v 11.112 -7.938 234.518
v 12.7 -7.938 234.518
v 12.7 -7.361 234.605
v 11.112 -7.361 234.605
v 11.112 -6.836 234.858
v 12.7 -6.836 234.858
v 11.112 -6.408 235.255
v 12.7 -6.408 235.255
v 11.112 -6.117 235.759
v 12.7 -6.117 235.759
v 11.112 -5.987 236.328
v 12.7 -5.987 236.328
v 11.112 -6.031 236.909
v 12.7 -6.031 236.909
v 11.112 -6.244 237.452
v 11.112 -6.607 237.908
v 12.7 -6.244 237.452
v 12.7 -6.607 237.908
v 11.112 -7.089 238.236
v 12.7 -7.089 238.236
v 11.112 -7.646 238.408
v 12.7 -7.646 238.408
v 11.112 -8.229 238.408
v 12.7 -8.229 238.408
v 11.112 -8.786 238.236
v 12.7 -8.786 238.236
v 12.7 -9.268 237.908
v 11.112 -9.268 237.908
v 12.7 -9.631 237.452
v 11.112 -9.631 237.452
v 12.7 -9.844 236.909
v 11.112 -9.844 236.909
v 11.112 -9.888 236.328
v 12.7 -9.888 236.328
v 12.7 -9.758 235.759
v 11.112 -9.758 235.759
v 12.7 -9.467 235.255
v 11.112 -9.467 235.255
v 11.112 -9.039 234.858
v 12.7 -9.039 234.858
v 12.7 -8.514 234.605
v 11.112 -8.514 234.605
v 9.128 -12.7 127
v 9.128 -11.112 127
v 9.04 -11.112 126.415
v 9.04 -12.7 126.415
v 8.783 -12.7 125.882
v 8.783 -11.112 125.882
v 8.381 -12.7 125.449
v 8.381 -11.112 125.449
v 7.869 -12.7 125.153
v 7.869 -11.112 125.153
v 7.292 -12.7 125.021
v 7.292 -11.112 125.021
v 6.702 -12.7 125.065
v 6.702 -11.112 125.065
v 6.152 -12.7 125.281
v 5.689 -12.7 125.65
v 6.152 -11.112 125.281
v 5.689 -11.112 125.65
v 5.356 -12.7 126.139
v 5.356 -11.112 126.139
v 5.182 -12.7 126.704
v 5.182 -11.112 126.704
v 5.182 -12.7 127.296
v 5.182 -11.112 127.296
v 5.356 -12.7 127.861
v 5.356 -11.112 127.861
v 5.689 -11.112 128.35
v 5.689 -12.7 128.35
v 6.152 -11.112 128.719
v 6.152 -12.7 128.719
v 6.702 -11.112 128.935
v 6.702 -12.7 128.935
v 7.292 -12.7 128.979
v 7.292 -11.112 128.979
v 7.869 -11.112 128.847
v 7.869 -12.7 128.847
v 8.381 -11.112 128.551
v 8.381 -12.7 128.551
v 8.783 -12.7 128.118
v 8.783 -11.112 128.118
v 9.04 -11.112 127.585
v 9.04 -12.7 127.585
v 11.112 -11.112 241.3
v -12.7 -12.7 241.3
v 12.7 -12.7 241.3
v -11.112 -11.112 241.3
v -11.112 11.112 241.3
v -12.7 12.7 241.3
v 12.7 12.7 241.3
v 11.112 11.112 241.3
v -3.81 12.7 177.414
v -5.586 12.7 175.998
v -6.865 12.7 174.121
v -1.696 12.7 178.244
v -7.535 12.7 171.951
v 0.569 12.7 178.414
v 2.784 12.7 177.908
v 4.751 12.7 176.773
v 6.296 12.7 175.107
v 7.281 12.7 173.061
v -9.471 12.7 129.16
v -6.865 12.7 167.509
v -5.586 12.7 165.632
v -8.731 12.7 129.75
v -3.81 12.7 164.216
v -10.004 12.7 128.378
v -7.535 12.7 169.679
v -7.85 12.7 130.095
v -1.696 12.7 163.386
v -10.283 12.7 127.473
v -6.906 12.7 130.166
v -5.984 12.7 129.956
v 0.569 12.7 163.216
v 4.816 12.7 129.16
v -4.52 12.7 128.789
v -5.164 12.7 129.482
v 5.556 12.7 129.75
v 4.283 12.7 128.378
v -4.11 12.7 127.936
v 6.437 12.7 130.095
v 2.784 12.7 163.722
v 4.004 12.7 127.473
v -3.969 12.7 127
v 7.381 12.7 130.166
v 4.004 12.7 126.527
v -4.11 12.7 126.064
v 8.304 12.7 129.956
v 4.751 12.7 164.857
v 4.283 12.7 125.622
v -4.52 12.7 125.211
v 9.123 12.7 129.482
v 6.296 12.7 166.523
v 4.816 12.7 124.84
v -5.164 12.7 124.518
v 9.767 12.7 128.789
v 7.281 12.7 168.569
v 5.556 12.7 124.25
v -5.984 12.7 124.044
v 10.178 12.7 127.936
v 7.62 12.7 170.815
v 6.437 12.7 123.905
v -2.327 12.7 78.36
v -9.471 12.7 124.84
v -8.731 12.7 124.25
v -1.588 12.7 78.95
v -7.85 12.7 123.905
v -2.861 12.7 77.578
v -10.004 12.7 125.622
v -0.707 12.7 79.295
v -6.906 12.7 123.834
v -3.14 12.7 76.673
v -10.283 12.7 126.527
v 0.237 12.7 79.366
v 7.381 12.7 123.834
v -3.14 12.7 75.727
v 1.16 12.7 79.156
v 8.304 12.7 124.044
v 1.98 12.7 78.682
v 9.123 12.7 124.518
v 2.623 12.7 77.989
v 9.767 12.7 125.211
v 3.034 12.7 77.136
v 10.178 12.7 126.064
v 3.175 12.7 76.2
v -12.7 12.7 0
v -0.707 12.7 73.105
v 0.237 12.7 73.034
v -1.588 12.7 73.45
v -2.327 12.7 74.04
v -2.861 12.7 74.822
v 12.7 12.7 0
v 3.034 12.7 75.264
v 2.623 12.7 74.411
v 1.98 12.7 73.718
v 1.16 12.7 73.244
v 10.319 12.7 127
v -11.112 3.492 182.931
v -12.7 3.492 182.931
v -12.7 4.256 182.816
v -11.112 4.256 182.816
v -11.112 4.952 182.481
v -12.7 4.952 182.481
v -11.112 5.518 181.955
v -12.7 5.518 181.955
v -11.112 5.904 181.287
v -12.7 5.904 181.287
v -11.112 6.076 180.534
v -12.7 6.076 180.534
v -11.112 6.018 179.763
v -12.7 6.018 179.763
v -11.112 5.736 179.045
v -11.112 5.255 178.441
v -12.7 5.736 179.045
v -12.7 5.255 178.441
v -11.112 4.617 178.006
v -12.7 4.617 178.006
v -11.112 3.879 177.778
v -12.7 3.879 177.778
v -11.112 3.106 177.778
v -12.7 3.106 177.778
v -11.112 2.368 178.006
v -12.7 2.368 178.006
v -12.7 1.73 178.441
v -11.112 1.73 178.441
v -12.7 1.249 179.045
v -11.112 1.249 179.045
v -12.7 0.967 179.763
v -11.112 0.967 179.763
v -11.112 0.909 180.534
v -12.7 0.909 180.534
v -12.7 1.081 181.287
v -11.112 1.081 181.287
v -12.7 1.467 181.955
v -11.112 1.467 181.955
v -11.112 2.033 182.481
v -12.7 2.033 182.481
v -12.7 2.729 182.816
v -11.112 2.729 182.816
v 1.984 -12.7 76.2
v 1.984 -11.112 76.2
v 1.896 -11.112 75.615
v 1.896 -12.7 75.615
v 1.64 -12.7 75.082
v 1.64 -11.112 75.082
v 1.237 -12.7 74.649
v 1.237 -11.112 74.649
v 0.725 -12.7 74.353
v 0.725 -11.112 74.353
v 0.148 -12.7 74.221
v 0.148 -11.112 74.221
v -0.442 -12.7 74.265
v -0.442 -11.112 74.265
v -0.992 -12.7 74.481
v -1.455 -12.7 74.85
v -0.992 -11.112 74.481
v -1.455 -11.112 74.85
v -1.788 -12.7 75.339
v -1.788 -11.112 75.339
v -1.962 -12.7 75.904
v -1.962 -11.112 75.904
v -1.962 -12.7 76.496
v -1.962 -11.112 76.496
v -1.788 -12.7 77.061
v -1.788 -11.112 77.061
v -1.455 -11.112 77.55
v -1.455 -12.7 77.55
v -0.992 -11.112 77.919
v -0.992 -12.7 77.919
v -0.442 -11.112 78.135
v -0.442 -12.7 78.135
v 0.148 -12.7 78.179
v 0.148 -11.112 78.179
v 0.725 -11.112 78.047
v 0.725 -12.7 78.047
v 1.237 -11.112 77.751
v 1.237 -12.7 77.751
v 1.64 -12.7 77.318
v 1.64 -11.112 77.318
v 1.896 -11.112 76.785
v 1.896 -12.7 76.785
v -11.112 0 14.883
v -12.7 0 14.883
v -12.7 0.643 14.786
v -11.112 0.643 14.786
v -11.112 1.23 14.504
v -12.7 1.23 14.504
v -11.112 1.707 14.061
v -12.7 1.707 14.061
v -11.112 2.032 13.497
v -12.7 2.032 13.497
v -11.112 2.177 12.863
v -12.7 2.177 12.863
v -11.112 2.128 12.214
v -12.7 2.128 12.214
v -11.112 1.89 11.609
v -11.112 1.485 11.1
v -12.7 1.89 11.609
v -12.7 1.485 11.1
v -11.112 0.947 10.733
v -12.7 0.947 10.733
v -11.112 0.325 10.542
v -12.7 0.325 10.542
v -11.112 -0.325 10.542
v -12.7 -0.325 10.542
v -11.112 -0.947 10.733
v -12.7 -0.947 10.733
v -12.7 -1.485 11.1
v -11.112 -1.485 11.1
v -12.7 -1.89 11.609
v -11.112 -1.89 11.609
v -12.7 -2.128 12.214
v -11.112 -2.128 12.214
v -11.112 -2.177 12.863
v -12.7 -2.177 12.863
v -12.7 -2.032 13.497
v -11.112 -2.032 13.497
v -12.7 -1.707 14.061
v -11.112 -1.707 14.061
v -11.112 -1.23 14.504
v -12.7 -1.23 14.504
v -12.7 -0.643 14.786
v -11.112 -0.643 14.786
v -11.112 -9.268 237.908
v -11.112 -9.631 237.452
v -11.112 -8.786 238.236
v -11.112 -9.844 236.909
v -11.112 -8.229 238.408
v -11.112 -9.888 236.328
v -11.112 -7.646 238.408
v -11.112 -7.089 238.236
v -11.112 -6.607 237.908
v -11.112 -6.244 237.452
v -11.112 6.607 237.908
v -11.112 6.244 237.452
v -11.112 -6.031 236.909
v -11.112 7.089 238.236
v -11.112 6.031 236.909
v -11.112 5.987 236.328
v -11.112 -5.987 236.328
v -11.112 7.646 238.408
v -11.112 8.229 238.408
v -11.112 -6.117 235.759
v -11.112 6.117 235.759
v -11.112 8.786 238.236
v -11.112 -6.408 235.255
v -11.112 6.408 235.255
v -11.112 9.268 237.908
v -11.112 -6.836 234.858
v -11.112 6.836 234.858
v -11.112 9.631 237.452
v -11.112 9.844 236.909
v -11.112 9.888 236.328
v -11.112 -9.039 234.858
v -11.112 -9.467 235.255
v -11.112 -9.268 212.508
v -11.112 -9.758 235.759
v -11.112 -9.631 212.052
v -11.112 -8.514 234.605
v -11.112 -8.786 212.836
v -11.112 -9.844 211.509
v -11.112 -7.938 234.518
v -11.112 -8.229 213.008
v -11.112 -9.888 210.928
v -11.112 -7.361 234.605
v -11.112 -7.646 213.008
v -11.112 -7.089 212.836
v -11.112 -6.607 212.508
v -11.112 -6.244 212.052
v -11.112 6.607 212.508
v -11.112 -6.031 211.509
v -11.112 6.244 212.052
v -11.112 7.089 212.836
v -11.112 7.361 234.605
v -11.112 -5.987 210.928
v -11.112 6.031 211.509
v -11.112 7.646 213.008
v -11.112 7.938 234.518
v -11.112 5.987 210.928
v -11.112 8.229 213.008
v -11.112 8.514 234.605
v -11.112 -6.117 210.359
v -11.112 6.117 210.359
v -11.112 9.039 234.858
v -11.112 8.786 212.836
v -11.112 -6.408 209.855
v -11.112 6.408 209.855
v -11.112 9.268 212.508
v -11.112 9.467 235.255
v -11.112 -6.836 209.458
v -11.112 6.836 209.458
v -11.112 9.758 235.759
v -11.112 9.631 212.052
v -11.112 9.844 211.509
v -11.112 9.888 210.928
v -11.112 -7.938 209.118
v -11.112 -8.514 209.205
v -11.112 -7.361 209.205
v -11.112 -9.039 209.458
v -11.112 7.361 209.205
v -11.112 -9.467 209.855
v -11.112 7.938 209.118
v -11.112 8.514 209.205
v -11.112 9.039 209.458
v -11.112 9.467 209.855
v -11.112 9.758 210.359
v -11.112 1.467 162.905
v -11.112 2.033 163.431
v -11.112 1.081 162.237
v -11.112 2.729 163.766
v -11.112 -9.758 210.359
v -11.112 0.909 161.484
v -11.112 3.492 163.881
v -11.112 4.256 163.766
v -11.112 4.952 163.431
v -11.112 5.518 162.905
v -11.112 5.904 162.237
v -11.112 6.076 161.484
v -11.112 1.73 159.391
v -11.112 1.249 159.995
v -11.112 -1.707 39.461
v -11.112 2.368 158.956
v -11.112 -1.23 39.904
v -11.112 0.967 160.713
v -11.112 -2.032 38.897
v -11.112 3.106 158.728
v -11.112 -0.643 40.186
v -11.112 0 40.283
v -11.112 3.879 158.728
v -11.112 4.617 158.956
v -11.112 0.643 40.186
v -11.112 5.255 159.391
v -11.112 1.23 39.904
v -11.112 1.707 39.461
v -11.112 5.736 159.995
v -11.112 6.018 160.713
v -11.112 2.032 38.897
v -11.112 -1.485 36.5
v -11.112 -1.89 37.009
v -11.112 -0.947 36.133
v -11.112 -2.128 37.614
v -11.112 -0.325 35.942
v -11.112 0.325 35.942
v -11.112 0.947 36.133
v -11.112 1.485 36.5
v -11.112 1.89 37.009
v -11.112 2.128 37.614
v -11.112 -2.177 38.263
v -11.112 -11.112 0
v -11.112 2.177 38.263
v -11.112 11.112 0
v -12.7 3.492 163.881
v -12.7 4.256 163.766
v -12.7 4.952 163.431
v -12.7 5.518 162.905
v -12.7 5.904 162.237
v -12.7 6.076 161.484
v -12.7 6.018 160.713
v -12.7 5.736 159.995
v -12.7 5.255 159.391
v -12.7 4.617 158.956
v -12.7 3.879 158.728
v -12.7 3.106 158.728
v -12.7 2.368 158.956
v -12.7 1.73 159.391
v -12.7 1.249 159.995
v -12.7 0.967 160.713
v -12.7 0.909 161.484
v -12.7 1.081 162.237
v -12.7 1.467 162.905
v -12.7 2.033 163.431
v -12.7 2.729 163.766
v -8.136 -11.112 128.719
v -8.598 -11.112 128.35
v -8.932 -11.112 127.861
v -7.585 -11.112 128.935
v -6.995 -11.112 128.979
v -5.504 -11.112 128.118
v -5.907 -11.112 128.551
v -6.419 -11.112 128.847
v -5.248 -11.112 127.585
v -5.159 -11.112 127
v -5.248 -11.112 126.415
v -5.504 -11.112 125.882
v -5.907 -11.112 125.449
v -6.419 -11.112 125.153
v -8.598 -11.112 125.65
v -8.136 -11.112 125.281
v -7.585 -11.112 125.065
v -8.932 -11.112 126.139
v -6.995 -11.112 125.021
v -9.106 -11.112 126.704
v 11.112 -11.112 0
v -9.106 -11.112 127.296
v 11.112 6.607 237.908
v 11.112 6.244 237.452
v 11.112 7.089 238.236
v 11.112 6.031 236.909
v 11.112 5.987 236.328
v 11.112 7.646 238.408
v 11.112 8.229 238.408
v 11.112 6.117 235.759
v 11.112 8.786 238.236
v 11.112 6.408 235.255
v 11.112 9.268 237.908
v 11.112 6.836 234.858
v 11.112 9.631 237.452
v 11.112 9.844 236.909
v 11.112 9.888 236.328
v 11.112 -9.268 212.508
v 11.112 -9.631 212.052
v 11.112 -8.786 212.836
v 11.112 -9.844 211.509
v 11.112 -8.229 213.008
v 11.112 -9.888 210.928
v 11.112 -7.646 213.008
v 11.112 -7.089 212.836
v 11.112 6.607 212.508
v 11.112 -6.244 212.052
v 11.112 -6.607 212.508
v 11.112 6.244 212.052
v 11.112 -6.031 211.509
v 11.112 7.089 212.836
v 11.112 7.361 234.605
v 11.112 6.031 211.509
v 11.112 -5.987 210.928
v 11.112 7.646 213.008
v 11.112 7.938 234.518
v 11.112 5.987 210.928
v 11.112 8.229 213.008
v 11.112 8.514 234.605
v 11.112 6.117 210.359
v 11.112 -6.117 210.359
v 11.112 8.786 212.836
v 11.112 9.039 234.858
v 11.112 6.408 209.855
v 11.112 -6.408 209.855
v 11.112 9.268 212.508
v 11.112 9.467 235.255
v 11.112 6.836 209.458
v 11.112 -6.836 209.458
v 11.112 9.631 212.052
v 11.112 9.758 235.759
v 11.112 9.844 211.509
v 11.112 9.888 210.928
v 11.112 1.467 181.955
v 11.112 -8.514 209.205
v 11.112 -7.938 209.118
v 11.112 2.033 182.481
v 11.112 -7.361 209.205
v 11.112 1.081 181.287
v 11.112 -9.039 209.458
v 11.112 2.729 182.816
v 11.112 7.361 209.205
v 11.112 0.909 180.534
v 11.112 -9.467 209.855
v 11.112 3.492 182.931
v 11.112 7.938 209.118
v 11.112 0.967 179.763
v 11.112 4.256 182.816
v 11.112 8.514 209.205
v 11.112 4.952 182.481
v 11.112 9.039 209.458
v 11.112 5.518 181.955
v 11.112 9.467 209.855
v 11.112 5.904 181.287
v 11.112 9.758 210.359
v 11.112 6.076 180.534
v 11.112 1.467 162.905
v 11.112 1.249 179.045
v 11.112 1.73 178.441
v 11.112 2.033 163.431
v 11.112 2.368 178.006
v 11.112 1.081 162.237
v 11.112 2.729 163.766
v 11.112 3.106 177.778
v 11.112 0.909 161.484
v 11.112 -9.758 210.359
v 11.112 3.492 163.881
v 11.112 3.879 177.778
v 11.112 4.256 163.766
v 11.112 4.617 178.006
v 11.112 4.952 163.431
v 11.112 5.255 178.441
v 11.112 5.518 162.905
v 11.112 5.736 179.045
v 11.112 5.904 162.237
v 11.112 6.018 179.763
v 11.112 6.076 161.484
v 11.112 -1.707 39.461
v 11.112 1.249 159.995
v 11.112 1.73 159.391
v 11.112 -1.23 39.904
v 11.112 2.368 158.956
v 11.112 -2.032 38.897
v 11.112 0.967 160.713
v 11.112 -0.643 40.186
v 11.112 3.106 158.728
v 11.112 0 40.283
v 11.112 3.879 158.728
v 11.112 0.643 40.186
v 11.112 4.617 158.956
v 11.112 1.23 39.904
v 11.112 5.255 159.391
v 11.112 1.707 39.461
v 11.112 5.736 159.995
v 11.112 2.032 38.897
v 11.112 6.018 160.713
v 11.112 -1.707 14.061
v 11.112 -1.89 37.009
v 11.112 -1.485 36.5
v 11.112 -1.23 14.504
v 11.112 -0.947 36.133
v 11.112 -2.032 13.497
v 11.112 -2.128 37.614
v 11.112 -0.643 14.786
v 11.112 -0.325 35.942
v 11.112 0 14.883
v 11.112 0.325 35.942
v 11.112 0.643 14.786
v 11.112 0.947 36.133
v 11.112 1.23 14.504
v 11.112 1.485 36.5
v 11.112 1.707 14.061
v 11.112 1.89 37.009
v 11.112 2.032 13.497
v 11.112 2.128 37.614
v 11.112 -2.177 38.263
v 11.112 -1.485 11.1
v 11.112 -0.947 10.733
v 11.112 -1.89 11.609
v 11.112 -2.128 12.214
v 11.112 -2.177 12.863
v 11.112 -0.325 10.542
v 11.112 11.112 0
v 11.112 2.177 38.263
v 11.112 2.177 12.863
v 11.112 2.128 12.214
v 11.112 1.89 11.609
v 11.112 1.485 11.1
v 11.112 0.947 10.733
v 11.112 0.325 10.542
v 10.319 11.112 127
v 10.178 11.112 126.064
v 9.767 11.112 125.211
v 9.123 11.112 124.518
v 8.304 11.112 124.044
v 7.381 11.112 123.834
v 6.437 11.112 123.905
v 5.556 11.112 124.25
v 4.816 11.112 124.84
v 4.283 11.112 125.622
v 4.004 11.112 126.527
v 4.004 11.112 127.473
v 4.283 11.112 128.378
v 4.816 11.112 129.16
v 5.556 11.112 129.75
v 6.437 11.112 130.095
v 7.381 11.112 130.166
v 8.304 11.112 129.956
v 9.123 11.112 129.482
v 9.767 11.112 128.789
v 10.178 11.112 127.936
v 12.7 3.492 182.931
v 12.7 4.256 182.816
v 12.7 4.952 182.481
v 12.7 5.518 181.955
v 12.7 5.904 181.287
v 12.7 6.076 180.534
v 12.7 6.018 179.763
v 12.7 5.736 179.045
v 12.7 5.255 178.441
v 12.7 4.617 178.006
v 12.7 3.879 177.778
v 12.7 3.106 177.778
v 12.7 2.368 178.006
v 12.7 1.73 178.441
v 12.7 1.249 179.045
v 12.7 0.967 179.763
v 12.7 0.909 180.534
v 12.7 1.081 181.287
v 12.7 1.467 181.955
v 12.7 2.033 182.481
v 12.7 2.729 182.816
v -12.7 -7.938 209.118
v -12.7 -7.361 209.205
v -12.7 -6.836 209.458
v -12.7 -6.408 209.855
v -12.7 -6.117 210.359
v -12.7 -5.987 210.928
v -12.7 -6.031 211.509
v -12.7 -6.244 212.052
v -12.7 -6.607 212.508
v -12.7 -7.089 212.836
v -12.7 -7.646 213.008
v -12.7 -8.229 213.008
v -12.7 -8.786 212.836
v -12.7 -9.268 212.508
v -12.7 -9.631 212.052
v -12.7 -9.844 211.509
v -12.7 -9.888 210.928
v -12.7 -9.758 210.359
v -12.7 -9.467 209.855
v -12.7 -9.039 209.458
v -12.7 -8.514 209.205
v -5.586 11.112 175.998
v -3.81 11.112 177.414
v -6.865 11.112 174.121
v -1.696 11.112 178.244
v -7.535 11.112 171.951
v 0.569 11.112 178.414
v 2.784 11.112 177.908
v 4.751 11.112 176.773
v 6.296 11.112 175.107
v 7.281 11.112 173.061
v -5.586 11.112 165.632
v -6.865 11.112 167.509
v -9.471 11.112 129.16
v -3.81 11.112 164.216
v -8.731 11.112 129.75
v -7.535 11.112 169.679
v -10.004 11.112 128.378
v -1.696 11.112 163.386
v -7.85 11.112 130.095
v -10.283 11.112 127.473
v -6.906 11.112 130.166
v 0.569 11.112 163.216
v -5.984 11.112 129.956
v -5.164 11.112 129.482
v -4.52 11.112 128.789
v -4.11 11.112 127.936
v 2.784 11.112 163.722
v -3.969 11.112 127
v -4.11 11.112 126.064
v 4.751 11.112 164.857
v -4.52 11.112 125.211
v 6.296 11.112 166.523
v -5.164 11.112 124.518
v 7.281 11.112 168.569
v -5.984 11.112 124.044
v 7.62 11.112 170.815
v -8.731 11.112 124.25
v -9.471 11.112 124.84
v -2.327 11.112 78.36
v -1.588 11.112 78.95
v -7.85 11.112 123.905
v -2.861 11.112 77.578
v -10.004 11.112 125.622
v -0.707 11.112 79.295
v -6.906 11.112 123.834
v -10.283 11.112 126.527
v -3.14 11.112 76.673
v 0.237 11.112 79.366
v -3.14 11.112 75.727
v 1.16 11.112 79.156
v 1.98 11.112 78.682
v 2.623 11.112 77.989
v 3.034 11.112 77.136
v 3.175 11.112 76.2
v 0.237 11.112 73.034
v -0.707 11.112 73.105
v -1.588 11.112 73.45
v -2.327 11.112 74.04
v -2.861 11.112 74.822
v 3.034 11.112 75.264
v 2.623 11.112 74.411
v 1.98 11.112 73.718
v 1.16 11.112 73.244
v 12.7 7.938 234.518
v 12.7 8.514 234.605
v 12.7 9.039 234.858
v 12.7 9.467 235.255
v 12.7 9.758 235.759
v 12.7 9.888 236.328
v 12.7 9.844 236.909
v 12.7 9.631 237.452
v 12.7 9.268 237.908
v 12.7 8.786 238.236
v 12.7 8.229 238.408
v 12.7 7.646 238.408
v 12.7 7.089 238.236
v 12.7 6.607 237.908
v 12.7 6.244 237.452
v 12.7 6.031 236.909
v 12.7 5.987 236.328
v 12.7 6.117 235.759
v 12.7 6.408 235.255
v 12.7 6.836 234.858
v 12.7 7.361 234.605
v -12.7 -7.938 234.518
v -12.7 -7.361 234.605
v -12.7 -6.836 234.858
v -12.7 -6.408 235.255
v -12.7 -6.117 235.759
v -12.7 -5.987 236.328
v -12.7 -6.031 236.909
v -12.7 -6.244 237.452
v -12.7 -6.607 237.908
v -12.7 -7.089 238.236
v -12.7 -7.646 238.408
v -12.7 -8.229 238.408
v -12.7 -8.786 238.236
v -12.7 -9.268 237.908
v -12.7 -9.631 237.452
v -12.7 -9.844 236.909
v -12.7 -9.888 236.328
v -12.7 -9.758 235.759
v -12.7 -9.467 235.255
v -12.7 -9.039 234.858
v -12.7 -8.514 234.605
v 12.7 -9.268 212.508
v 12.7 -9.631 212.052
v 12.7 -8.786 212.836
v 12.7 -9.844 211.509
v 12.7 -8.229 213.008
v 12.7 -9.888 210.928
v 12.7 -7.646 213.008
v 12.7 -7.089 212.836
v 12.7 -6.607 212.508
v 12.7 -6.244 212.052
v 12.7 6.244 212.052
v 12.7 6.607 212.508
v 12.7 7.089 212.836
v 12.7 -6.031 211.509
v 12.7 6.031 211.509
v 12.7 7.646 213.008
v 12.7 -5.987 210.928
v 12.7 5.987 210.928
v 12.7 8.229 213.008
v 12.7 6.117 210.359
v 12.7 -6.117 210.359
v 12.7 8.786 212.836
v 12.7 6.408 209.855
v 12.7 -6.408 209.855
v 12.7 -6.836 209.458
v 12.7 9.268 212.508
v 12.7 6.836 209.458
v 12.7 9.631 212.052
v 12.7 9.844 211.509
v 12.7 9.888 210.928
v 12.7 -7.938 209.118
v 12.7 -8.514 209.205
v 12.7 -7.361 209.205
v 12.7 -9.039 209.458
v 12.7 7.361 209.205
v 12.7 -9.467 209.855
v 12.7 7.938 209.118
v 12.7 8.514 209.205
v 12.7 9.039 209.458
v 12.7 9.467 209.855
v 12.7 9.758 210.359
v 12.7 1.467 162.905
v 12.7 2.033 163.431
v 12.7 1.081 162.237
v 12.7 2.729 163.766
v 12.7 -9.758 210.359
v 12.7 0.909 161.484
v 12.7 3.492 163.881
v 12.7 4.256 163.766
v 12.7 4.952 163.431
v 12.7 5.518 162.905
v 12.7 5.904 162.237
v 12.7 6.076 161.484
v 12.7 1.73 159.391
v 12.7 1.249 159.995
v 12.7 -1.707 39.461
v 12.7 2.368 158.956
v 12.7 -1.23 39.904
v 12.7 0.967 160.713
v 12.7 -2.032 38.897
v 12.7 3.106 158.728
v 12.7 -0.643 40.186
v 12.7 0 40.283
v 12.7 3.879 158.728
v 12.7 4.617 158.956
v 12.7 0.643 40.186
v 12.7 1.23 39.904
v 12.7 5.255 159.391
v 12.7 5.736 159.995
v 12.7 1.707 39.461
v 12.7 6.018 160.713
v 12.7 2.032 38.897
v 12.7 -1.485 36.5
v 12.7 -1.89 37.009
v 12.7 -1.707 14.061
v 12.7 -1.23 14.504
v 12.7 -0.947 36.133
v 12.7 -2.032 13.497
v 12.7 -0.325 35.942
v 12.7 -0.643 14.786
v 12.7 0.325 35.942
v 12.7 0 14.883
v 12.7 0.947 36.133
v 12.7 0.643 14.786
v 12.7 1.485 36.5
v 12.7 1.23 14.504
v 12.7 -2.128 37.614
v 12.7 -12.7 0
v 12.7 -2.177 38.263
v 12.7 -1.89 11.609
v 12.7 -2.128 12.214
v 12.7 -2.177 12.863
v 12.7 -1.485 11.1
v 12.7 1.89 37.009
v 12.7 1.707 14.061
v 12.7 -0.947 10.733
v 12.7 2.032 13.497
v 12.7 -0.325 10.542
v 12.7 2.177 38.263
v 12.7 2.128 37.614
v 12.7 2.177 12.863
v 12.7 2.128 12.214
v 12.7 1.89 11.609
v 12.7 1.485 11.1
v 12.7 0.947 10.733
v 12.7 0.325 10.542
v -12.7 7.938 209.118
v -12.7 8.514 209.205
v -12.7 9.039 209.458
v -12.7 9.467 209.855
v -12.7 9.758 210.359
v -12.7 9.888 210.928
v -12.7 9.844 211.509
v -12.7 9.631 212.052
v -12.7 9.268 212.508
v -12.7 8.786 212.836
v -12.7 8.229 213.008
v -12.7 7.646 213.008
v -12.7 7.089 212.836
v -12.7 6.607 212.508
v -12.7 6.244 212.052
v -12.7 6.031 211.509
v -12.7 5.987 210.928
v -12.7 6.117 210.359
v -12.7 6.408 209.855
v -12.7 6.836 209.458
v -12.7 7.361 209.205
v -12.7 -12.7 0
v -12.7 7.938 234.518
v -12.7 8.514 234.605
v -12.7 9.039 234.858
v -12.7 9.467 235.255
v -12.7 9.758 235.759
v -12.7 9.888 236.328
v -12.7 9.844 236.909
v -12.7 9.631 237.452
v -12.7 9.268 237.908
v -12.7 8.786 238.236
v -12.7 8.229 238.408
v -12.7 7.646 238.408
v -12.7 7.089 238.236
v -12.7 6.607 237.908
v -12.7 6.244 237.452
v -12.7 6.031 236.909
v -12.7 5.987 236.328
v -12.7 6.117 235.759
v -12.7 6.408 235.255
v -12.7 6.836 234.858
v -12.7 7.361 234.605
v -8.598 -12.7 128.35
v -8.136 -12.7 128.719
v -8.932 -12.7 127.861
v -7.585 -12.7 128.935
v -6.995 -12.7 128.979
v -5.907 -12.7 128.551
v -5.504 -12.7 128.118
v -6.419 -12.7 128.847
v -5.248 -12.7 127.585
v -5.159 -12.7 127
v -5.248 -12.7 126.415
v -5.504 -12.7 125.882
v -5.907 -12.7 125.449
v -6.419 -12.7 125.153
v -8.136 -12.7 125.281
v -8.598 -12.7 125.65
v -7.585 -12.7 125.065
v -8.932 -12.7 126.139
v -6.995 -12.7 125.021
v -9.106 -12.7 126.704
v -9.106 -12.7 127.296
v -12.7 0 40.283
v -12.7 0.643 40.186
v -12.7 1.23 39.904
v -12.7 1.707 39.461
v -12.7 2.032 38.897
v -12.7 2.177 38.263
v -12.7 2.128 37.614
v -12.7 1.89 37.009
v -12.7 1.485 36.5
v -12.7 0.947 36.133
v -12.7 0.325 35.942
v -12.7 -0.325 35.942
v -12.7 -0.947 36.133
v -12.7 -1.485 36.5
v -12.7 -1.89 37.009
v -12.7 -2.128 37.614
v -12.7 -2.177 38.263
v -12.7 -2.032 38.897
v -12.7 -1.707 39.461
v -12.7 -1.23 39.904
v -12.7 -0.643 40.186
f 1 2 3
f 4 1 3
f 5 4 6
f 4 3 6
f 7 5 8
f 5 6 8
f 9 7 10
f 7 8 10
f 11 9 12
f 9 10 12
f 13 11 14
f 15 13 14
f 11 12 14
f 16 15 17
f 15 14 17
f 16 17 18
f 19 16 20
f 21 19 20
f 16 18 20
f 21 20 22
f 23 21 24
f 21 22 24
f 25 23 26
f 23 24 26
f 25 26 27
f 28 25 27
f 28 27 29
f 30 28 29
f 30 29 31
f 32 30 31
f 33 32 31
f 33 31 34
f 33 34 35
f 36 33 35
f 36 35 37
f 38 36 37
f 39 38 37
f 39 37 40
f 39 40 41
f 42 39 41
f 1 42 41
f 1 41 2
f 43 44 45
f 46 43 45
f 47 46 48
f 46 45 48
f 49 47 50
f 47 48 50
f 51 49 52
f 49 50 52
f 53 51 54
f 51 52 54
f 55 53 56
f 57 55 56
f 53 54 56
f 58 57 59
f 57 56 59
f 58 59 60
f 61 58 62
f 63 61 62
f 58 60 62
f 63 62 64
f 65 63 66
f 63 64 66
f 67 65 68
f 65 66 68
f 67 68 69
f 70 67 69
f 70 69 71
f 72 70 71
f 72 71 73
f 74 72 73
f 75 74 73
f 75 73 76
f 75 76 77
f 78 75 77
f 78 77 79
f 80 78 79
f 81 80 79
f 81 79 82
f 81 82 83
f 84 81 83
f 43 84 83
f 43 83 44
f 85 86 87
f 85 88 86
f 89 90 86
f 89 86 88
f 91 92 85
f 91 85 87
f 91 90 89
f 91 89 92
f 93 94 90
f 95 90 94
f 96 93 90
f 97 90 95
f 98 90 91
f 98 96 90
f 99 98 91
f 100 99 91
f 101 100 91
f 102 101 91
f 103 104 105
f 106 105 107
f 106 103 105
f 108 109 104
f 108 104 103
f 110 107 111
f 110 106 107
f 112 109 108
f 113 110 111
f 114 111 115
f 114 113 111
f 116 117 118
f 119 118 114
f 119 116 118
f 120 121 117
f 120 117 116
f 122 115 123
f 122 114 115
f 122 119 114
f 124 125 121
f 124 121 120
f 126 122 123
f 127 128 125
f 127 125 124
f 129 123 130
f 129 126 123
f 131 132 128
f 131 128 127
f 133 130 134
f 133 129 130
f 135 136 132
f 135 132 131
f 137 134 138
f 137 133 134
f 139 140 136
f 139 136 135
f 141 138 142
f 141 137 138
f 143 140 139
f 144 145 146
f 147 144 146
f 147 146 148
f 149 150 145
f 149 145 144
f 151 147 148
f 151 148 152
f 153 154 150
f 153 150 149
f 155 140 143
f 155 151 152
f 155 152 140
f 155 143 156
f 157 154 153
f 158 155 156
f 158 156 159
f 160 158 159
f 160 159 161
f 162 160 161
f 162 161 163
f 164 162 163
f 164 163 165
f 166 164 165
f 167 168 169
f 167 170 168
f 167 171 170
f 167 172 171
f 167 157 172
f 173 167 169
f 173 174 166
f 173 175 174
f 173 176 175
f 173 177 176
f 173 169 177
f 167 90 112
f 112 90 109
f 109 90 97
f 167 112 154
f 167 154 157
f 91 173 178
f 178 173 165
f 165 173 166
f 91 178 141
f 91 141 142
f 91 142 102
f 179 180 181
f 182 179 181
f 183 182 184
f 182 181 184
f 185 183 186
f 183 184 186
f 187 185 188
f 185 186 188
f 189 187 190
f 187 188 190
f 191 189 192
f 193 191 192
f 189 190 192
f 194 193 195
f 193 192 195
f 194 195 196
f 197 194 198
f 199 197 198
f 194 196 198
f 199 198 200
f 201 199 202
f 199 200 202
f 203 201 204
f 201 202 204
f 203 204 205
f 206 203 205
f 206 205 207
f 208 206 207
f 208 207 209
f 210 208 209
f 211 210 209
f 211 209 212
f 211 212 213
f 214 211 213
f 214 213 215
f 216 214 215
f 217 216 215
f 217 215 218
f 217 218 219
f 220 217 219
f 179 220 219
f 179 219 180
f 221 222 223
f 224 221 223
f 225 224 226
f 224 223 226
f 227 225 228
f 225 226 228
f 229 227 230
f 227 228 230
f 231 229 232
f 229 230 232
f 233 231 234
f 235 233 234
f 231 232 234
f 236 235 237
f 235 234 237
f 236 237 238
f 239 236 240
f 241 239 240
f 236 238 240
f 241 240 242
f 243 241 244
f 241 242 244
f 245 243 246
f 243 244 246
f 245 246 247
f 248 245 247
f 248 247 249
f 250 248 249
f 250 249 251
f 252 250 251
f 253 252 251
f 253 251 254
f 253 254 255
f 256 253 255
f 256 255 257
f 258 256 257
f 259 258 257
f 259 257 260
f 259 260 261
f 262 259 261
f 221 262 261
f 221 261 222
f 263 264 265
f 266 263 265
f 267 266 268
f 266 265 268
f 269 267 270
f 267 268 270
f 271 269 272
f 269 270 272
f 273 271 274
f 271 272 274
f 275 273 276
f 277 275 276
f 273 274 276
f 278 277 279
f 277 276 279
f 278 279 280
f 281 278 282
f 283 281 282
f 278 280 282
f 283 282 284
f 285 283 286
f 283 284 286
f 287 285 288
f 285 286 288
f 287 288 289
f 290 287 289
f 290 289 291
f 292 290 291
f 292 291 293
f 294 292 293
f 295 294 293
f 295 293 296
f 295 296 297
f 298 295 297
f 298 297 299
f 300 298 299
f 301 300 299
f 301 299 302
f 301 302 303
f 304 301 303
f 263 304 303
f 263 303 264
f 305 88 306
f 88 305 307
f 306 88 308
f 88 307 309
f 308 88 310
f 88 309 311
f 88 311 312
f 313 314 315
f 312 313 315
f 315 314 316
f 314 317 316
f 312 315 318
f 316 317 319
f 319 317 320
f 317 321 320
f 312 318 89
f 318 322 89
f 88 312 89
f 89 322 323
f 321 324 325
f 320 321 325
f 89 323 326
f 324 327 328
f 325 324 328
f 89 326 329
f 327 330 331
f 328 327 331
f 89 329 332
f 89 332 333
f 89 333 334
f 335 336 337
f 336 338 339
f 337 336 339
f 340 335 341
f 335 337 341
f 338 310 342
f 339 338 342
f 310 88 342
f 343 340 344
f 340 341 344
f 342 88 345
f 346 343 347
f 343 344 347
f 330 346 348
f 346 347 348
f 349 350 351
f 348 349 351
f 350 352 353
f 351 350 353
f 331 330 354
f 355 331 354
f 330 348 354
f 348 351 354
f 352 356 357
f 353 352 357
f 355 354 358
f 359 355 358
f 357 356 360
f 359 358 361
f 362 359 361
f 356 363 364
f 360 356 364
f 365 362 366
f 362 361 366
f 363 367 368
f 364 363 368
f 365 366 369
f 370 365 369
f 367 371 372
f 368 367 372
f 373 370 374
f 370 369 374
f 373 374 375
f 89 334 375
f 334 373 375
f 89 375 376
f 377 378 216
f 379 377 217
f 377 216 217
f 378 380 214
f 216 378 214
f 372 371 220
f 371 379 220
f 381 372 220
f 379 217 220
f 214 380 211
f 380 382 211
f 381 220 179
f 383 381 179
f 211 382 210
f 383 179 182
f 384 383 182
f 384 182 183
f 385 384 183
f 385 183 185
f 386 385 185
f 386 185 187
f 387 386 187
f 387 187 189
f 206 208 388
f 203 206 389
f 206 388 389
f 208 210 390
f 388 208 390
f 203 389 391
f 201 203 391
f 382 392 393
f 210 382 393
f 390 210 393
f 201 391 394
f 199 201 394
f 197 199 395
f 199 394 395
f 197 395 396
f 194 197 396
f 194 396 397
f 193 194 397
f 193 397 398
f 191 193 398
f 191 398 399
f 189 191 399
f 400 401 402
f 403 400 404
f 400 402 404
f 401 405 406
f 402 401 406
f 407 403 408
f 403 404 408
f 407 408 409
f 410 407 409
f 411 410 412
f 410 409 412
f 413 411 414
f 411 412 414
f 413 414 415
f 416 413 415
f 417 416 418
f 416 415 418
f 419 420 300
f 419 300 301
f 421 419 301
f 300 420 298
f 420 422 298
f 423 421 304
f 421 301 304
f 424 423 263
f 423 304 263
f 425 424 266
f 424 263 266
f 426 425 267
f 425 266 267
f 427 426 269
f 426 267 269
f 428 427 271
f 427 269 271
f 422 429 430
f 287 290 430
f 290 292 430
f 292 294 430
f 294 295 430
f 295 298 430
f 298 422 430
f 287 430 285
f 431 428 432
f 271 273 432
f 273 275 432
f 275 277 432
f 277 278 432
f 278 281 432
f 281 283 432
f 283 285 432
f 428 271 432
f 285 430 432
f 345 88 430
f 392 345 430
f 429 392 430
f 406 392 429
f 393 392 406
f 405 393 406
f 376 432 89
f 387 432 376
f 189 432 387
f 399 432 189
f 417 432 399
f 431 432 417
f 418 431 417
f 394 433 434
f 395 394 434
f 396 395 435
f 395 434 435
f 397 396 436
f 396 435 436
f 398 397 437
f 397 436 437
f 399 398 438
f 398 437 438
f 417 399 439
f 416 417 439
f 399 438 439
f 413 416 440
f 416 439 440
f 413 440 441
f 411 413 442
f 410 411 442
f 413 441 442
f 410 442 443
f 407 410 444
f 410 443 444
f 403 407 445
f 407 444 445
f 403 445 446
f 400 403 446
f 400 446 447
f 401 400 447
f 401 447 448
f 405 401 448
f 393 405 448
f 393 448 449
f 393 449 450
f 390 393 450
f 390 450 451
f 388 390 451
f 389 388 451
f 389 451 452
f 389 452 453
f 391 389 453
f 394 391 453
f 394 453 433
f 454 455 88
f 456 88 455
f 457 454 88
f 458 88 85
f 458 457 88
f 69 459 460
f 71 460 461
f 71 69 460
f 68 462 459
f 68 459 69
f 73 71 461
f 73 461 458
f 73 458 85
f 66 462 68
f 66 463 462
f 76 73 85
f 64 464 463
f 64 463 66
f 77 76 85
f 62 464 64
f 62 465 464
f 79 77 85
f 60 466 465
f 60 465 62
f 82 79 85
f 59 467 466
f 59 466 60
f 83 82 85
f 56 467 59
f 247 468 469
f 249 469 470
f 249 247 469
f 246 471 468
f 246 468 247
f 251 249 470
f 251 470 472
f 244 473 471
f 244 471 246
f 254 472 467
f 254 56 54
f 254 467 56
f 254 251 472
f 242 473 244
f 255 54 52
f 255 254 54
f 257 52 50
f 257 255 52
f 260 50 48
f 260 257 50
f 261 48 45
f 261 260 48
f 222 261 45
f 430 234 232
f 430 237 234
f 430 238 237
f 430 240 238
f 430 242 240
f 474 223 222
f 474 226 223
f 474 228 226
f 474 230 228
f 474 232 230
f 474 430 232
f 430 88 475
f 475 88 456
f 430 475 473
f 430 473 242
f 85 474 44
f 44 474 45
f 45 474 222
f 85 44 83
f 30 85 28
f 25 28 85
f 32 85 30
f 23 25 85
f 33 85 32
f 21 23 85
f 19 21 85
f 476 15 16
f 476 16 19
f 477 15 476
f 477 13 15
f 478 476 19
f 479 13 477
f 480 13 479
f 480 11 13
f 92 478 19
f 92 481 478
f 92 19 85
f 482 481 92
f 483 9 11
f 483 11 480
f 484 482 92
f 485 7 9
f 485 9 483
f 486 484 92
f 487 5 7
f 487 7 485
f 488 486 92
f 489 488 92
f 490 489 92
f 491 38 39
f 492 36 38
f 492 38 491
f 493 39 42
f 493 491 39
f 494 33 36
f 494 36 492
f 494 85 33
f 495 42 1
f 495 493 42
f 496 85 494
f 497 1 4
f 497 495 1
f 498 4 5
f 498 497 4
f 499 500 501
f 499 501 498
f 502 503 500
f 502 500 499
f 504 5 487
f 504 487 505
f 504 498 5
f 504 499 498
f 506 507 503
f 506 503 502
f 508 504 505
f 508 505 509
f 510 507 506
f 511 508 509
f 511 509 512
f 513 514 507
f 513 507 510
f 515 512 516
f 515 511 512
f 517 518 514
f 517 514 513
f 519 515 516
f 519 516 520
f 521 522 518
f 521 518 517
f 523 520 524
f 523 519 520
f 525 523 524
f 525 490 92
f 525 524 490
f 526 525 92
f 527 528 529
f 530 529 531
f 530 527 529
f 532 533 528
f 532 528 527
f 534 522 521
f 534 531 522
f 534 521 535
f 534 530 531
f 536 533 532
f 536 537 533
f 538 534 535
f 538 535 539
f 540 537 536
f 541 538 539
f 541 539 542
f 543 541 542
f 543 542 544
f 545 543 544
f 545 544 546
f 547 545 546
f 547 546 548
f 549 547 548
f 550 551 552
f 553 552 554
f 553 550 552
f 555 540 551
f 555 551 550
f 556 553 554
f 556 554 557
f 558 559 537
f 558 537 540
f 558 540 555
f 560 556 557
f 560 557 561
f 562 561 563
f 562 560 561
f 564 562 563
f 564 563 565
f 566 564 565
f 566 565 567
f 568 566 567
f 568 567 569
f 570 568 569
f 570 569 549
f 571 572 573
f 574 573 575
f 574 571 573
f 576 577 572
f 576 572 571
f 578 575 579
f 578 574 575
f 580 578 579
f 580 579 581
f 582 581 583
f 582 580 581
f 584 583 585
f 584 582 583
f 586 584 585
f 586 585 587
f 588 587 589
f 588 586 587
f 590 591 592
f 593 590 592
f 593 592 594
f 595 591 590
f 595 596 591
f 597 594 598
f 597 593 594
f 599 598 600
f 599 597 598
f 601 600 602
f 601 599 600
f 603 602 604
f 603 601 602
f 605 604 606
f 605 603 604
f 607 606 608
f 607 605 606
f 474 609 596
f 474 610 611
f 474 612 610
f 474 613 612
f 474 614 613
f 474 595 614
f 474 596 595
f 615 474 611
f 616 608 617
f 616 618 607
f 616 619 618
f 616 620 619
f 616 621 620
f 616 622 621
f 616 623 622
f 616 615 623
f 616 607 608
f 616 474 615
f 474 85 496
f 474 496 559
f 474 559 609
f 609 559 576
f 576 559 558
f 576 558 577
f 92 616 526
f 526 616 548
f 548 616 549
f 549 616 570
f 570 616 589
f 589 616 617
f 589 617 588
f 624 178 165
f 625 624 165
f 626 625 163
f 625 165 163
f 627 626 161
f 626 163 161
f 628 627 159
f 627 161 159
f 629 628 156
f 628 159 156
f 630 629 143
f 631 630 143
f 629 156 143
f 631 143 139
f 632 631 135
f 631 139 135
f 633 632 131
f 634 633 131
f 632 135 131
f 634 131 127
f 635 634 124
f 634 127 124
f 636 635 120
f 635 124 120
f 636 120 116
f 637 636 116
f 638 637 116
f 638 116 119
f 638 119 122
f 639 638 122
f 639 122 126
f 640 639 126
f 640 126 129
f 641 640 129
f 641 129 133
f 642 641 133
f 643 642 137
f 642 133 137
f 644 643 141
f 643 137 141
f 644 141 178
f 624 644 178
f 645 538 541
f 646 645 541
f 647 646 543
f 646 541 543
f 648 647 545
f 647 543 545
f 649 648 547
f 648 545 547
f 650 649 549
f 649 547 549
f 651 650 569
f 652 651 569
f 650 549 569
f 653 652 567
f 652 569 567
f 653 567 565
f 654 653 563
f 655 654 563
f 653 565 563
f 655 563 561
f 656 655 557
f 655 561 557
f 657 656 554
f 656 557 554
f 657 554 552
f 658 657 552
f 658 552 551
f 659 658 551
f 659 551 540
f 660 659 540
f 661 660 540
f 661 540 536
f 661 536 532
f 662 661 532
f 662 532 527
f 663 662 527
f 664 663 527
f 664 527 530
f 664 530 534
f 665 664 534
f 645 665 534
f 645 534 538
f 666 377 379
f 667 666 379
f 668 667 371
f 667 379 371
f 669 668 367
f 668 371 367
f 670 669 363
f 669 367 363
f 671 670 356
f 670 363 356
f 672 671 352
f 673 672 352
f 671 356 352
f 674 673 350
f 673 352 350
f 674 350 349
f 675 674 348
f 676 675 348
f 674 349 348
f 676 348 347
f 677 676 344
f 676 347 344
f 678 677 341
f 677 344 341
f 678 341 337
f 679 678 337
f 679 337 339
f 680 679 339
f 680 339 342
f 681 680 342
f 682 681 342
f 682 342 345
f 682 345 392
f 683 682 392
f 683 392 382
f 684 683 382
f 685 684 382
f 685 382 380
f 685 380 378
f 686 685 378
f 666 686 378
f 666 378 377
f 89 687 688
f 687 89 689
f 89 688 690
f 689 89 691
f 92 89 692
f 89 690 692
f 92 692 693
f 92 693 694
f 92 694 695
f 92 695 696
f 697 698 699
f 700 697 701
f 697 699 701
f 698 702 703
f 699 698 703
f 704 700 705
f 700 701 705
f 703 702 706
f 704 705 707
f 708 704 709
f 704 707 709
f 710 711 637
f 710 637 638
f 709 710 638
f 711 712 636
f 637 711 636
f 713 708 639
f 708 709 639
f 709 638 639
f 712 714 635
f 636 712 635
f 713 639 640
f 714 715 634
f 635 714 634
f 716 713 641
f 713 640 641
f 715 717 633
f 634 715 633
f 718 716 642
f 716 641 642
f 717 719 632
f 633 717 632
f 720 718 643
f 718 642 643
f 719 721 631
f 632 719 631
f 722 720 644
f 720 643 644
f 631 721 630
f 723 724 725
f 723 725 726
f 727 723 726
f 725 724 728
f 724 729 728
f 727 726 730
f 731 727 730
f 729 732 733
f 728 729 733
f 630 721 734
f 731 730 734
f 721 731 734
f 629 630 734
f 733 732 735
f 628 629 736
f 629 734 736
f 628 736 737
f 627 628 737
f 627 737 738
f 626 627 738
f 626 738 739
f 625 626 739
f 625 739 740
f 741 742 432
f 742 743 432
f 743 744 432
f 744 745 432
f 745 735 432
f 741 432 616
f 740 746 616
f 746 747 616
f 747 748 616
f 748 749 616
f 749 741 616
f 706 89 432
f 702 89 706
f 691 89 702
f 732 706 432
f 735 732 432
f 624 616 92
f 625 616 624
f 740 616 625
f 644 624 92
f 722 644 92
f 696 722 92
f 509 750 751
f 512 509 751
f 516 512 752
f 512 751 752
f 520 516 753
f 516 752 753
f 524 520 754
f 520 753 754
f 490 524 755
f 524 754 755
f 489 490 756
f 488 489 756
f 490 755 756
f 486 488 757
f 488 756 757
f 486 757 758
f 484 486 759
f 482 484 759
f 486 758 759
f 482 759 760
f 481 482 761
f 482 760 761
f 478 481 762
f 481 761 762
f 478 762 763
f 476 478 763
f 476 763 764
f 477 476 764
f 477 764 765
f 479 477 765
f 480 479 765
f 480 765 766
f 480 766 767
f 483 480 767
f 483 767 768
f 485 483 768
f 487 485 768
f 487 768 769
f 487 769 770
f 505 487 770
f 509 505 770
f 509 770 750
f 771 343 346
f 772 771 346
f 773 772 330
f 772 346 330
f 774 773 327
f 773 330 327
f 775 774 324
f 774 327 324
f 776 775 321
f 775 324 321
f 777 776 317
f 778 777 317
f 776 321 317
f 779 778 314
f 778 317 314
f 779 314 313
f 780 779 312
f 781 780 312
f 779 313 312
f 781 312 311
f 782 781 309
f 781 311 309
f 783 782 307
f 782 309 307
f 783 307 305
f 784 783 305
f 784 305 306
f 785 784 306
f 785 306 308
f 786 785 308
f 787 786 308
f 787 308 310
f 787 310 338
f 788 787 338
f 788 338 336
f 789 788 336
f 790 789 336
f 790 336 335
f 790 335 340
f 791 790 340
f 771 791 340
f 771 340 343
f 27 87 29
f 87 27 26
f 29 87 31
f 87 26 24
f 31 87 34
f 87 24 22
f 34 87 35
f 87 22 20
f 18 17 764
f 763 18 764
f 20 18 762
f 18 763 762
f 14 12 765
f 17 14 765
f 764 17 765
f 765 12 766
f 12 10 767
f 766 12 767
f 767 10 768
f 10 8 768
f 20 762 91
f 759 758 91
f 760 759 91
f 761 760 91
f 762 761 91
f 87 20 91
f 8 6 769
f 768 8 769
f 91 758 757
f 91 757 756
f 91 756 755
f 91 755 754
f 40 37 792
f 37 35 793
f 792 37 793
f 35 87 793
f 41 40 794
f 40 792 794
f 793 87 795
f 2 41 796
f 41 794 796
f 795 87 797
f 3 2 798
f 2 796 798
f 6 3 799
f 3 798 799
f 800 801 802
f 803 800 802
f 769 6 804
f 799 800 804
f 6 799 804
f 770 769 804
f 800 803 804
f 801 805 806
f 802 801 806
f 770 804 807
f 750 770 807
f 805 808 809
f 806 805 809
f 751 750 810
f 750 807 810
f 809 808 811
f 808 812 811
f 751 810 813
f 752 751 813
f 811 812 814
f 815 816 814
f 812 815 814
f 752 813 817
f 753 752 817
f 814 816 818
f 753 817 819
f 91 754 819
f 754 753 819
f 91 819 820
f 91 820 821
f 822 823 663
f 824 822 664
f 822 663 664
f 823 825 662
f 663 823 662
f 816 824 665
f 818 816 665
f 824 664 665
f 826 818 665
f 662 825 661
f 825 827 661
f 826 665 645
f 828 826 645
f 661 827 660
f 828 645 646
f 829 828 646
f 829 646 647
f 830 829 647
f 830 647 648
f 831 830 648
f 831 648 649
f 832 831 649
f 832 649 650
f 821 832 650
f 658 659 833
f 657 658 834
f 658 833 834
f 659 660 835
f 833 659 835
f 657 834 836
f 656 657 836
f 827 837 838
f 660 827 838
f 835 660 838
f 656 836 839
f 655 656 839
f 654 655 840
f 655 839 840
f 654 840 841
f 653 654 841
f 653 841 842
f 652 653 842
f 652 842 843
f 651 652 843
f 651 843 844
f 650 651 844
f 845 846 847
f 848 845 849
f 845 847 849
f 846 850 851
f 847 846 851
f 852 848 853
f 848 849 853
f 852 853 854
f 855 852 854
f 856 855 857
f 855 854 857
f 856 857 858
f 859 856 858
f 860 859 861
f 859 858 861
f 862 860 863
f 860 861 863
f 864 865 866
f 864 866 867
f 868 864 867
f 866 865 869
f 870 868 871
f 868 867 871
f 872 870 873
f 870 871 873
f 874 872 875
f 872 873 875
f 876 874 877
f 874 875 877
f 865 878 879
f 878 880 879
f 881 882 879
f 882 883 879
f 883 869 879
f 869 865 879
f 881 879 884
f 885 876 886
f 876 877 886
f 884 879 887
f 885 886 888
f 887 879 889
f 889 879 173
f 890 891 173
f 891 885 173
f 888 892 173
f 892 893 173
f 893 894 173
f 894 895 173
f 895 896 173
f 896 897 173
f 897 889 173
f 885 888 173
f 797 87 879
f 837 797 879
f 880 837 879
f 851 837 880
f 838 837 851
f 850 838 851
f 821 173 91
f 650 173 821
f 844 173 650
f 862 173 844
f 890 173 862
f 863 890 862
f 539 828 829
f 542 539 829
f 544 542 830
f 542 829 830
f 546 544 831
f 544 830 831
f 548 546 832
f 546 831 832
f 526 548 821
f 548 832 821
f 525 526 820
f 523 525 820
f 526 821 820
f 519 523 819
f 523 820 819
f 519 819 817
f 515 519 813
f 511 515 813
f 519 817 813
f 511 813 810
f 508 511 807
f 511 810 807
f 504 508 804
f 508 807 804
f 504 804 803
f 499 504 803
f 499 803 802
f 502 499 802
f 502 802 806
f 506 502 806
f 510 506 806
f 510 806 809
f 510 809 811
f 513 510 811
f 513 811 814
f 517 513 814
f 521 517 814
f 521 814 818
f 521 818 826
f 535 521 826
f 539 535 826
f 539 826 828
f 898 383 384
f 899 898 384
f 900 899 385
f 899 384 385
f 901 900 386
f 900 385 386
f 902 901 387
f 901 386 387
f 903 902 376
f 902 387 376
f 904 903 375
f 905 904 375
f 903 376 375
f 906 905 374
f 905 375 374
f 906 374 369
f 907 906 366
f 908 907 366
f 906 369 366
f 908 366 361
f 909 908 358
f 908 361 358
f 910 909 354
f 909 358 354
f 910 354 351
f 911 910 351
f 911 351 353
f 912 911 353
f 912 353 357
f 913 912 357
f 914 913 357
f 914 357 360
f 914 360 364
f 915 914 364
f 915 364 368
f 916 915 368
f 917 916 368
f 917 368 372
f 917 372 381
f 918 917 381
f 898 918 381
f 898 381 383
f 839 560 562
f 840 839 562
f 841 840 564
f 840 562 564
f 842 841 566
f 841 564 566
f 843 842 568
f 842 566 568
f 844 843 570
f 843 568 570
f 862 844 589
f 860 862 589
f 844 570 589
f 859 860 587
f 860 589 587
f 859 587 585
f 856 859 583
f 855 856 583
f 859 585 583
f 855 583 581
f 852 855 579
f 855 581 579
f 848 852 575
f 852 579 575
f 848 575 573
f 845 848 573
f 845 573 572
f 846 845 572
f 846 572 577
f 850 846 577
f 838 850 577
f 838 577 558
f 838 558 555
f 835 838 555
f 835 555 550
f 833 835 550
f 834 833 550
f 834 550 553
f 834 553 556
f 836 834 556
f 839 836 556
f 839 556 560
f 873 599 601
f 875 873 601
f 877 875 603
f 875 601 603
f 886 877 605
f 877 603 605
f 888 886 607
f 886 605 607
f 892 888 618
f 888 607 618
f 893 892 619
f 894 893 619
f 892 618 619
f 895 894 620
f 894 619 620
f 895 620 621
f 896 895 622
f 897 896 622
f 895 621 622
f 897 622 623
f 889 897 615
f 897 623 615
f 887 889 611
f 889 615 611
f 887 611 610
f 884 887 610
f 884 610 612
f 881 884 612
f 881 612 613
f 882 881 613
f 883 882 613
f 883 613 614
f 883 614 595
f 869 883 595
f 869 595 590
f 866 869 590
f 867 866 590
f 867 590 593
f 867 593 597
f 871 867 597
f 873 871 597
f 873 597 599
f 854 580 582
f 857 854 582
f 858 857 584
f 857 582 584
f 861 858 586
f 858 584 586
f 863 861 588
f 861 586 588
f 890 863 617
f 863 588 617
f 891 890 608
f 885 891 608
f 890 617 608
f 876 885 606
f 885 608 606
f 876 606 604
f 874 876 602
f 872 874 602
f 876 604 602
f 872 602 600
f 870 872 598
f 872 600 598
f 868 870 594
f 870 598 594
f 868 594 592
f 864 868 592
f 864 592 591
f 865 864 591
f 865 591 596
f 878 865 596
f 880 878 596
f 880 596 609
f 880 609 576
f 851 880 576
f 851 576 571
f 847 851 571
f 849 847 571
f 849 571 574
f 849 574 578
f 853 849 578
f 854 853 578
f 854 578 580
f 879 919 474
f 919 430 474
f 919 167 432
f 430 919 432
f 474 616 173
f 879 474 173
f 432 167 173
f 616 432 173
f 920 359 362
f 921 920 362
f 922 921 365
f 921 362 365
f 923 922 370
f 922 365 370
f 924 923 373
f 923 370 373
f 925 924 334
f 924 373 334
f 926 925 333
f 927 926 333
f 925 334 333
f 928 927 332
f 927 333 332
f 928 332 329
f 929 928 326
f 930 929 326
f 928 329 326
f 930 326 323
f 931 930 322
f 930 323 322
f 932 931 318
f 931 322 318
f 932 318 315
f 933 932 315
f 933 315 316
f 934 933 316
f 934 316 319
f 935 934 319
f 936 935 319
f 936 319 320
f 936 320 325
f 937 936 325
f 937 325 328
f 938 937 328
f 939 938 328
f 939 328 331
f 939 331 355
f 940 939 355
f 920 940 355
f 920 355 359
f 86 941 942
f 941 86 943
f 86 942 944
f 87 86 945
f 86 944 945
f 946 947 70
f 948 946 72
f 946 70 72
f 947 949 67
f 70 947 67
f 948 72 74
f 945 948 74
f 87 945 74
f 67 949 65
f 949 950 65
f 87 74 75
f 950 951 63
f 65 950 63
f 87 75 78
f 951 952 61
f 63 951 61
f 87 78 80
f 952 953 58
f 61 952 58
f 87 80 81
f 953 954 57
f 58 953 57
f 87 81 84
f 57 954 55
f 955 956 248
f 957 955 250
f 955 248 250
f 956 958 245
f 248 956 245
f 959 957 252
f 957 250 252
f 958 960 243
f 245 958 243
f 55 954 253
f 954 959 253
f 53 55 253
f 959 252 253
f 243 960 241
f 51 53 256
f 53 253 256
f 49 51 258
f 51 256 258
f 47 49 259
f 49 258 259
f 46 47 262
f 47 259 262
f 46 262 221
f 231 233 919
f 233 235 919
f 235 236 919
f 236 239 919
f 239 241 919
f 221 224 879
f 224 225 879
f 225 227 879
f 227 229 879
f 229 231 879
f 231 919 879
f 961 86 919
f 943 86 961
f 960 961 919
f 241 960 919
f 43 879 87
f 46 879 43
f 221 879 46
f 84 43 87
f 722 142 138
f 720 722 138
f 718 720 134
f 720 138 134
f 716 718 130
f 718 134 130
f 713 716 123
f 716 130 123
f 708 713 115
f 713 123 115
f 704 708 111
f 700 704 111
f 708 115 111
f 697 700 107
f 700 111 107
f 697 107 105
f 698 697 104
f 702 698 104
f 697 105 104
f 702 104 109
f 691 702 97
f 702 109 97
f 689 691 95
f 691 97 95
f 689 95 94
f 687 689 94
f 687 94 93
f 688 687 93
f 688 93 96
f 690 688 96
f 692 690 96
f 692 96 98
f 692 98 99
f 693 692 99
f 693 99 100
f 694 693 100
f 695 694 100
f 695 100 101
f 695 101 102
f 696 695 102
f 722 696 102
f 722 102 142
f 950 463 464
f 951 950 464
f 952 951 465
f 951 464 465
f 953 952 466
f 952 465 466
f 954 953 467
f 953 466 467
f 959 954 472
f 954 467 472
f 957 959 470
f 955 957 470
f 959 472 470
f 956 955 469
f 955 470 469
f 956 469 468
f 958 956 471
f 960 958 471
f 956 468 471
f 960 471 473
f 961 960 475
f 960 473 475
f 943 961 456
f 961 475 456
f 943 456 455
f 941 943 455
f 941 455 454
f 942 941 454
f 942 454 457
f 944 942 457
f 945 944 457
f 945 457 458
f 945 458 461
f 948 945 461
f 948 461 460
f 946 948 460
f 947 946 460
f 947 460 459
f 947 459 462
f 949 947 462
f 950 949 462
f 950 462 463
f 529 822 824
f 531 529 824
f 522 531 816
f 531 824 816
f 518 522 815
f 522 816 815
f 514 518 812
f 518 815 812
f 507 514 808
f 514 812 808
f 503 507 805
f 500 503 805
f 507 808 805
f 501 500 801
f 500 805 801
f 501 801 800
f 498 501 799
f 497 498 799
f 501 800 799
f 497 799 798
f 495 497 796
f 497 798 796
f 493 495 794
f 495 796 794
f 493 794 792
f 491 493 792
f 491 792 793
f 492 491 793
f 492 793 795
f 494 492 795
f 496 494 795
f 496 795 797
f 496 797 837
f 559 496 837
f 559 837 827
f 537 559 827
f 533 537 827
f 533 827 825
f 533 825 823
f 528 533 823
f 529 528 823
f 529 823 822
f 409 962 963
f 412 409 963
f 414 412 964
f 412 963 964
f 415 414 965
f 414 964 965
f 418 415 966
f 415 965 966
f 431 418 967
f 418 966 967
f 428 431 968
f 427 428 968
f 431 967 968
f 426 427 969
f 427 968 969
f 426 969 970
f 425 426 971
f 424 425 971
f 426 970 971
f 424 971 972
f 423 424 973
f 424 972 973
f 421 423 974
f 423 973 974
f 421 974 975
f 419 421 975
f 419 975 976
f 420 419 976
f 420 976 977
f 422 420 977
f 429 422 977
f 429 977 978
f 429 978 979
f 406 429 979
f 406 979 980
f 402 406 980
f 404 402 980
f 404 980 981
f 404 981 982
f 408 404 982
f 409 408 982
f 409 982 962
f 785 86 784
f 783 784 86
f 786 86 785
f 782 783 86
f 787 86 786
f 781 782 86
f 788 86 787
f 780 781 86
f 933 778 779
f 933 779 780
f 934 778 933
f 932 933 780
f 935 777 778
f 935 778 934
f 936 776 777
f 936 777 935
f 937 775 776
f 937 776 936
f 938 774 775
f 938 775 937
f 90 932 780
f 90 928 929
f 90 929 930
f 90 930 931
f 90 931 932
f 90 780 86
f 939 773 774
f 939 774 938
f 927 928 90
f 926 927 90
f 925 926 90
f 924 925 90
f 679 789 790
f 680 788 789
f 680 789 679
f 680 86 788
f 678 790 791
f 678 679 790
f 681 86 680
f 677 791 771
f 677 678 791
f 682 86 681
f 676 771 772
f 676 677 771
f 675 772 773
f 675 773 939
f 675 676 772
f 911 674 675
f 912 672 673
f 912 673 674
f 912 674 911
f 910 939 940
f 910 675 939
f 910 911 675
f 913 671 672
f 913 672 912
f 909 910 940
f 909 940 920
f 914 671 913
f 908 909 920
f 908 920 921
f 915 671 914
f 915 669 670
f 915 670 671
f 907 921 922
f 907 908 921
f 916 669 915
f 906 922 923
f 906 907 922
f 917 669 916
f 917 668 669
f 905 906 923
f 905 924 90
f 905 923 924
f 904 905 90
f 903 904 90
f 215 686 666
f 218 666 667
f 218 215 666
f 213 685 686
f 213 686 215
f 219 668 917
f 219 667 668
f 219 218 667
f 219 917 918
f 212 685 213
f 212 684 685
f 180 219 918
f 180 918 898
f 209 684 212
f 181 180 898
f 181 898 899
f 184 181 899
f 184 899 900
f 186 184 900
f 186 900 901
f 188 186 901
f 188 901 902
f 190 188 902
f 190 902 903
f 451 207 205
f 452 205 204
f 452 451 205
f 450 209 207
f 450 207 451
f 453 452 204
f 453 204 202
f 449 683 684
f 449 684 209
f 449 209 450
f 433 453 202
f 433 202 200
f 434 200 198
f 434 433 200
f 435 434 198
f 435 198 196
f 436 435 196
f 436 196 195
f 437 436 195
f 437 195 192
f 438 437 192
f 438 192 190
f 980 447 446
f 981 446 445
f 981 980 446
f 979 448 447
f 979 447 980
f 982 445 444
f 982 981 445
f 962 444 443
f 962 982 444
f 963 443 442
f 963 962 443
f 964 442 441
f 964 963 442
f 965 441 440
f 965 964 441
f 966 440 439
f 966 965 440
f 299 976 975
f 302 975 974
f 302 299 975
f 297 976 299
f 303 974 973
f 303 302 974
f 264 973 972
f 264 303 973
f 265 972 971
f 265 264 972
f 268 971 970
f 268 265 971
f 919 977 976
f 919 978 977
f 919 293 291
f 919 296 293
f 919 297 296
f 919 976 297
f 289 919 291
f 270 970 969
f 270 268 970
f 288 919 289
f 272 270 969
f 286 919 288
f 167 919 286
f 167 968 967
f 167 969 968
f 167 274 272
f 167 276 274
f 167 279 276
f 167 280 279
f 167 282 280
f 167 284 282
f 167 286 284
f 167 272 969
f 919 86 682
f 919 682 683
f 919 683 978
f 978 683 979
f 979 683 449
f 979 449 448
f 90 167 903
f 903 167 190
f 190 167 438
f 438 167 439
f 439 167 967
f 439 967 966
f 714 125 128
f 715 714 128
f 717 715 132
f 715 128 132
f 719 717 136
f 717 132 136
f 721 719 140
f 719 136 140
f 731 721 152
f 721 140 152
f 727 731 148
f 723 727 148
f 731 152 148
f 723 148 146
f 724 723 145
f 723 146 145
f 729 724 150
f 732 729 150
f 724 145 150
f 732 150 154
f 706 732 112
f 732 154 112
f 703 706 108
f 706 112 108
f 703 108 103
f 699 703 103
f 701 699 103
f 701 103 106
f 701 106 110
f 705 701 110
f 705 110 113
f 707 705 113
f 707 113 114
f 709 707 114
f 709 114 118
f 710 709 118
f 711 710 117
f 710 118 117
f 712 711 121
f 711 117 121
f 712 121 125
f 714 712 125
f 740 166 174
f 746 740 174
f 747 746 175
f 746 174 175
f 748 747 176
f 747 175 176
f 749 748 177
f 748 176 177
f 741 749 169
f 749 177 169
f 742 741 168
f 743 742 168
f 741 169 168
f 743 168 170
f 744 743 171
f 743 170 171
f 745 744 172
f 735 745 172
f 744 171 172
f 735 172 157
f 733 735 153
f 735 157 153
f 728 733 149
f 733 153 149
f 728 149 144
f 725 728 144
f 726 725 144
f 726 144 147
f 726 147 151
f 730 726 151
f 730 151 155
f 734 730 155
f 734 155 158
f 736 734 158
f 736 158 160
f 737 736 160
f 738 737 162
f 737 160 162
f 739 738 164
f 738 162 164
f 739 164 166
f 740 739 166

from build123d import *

# Parameters (mm, degrees)
SKETCH1_W           = 25.4
SKETCH1_H           = 25.4
SKETCH1_W_2         = 22.225
SKETCH1_H_2         = 22.225
BOSS_EXTRUDE1_DEPTH = 241.3
SKETCH7_R           = 1.984375
CUT_EXTRUDE8_DEPTH  = 26.4
SKETCH10_R          = 2.1828125
CUT_EXTRUDE7_DEPTH  = 25.4
SKETCH7_5_R         = 3.175
SKETCH7_5_R_2       = 1.984375
CUT_EXTRUDE9_DEPTH  = 1.5875
SKETCH13_R          = 2.5908
CUT_EXTRUDE10_DEPTH = 26.4
CUT_EXTRUDE11_REACH = 27.4
SKETCH14_R          = 7.62
SKETCH16_R          = 1.9558
CUT_EXTRUDE12_DEPTH = 26.4


with BuildPart() as part:
    # Sketch1 → Boss-Extrude1 (new body)
    with BuildSketch(Plane.XY):
        Rectangle(SKETCH1_W, SKETCH1_H)
        Rectangle(SKETCH1_W_2, SKETCH1_H_2, mode=Mode.SUBTRACT)
    extrude(amount=BOSS_EXTRUDE1_DEPTH)

    # Sketch7 → Cut-Extrude8 (cut, through all)
    with BuildSketch(Plane(origin=(0, 12.7, 0), x_dir=(1, 0, 0), z_dir=(0, 1, 0))):
        with Locations((-7.14375, -127)):
            Circle(SKETCH7_R)
        with Locations((7.14375, -127)):
            Circle(SKETCH7_R)
        with Locations((0, -76.2)):
            Circle(SKETCH7_R)
    extrude(amount=-CUT_EXTRUDE8_DEPTH, mode=Mode.SUBTRACT)

    # Sketch10 → Cut-Extrude7 (cut)
    with BuildSketch(Plane.ZY.offset(12.7)):
        with Locations((12.7, 0)):
            Circle(SKETCH10_R)
        with Locations((38.1, 0)):
            Circle(SKETCH10_R)
    extrude(amount=-CUT_EXTRUDE7_DEPTH, mode=Mode.SUBTRACT)

    # Sketch7<5> → Cut-Extrude9 (cut)
    with BuildSketch(Plane(origin=(0, 12.7, 0), x_dir=(1, 0, 0), z_dir=(0, 1, 0))):
        with Locations((-7.14375, -127)):
            Circle(SKETCH7_5_R)
        with Locations((-7.14375, -127)):
            Circle(SKETCH7_5_R_2, mode=Mode.SUBTRACT)
        with Locations((7.14375, -127)):
            Circle(SKETCH7_5_R)
        with Locations((7.14375, -127)):
            Circle(SKETCH7_5_R_2, mode=Mode.SUBTRACT)
        with Locations((0, -76.2)):
            Circle(SKETCH7_5_R)
        with Locations((0, -76.2)):
            Circle(SKETCH7_5_R_2, mode=Mode.SUBTRACT)
    extrude(amount=-CUT_EXTRUDE9_DEPTH, mode=Mode.SUBTRACT)

    # Sketch13 → Cut-Extrude10 (cut, through all)
    with BuildSketch(Plane.ZY.offset(12.7)):
        with Locations((161.29, 3.4925)):
            Circle(SKETCH13_R)
        with Locations((180.34, 3.4925)):
            Circle(SKETCH13_R)
    extrude(amount=-CUT_EXTRUDE10_DEPTH, mode=Mode.SUBTRACT)

    # Sketch14 → Cut-Extrude11 (cut, up to next)
    with BuildSketch(Plane(origin=(0, 12.7, 0), x_dir=(1, 0, 0), z_dir=(0, 1, 0)), mode=Mode.PRIVATE) as cut_extrude11_sk1:
        with Locations((0, -170.815)):
            Circle(SKETCH14_R)
    cut_extrude11_tool1 = extrude(cut_extrude11_sk1.sketch, amount=-CUT_EXTRUDE11_REACH, mode=Mode.PRIVATE) & part.part
    add(cut_extrude11_tool1.solids().sort_by_distance((0, 12.7, 170.815))[0], mode=Mode.SUBTRACT)

    # Sketch16 → Cut-Extrude12 (cut, through all)
    with BuildSketch(Plane(origin=(12.7, 0, 0), x_dir=(0, 0, -1), z_dir=(1, 0, 0))):
        with Locations((-236.474, -7.9375)):
            Circle(SKETCH16_R)
        with Locations((-236.474, 7.9375)):
            Circle(SKETCH16_R)
        with Locations((-211.074, -7.9375)):
            Circle(SKETCH16_R)
        with Locations((-211.074, 7.9375)):
            Circle(SKETCH16_R)
    extrude(amount=-CUT_EXTRUDE12_DEPTH, mode=Mode.SUBTRACT)


solid = part.part
